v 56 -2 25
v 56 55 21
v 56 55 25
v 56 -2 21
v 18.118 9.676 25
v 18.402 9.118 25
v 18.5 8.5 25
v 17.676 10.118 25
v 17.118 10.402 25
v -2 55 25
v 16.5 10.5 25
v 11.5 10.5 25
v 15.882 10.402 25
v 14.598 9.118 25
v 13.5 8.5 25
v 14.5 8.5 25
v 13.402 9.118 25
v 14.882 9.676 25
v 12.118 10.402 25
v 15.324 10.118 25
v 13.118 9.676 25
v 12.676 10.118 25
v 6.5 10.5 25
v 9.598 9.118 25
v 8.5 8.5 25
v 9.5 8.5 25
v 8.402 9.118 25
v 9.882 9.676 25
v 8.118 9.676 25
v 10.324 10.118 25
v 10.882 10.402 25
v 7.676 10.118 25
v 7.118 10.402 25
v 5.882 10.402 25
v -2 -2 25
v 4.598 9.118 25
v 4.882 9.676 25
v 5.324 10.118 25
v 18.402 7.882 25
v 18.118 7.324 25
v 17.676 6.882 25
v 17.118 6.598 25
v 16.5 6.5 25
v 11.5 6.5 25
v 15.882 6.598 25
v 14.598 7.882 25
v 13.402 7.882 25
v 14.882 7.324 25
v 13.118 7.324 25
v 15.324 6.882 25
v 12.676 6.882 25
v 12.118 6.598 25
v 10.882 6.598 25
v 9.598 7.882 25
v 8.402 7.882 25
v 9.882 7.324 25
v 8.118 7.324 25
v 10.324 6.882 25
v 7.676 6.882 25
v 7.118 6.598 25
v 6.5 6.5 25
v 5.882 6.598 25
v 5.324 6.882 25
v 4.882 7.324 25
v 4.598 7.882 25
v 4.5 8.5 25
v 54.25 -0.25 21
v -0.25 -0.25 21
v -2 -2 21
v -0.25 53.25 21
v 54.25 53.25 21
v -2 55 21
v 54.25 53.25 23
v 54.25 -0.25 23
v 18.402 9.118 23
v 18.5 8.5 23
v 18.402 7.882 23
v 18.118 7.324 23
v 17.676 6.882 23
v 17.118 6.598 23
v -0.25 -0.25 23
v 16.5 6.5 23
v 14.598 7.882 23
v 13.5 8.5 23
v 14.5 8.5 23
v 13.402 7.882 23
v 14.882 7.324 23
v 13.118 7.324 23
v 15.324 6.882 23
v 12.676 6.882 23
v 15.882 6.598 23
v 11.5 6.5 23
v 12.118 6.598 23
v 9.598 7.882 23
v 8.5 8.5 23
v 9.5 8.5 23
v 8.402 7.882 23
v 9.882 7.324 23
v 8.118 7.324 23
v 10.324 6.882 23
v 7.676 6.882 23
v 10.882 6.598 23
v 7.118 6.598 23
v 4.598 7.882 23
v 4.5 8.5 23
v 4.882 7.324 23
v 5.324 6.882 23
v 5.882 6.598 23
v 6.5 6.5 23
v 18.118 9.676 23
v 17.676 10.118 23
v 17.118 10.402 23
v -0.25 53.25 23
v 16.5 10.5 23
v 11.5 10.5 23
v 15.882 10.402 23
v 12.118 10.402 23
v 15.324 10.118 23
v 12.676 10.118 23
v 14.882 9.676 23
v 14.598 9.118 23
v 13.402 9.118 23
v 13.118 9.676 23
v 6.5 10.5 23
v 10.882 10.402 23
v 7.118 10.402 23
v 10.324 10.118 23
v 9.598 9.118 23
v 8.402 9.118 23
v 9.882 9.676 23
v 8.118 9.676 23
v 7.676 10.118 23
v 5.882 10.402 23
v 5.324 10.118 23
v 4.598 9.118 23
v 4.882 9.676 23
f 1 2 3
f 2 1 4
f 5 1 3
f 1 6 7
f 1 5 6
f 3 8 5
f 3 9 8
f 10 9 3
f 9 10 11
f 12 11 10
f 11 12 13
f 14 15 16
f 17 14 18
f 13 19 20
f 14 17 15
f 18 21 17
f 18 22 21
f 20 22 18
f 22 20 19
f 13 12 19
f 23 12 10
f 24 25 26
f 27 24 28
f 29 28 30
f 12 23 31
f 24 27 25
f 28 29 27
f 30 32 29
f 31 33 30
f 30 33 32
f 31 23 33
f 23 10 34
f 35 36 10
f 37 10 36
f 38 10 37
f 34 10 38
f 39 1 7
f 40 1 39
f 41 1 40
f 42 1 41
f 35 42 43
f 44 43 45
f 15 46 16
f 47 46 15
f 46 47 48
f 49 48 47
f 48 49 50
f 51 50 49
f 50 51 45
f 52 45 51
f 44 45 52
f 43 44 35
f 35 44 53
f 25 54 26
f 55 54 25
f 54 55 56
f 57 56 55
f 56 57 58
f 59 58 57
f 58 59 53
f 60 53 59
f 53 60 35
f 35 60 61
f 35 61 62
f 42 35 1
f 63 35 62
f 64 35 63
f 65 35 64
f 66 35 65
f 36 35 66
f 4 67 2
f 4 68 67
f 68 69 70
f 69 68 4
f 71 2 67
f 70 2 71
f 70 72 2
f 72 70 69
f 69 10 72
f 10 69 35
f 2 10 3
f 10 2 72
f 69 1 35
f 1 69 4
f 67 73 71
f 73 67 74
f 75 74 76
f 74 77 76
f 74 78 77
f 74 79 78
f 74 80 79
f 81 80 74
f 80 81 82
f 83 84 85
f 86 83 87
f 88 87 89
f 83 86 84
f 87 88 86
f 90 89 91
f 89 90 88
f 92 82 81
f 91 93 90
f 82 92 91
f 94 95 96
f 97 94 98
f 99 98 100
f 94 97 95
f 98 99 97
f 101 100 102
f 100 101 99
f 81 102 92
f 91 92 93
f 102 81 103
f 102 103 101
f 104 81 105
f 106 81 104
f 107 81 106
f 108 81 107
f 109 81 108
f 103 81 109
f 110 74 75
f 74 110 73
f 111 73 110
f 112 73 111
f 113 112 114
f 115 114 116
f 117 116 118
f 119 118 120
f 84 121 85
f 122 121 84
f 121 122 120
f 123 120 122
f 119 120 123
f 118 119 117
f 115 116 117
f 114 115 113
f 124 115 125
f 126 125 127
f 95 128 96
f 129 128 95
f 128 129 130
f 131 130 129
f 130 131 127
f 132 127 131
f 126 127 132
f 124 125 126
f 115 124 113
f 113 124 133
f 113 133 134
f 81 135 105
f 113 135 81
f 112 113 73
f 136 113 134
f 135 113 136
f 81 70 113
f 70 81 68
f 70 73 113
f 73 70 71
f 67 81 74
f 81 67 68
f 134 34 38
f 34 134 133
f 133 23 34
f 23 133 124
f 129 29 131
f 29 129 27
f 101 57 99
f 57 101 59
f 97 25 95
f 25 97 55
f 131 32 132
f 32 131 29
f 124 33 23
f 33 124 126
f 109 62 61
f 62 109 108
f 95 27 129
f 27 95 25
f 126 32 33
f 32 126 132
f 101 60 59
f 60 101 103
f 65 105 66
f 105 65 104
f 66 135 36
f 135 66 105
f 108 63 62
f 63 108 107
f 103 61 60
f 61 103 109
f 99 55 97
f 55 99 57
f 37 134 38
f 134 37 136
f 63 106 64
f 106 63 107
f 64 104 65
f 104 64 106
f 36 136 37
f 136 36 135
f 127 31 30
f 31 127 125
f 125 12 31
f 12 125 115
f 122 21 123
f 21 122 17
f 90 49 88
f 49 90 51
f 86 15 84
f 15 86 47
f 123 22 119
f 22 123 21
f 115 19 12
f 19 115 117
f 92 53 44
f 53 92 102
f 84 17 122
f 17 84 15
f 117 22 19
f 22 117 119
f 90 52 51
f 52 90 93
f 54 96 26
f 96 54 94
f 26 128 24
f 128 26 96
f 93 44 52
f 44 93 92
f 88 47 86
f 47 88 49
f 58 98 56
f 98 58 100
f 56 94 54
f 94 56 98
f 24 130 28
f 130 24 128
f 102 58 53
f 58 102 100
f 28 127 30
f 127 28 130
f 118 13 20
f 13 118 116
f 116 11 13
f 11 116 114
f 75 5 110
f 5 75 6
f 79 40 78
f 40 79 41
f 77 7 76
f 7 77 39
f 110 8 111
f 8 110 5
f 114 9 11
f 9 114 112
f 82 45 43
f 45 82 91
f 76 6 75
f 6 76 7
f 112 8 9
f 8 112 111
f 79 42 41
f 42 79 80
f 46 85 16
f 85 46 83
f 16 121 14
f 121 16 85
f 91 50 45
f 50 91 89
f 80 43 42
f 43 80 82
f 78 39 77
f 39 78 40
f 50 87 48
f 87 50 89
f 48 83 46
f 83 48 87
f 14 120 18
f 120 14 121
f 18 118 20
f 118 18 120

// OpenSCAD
// 48 x 49.5 x 20
// Ergots de maintiens au centre sur le coté 49.5
// 2mm sous PCB
// PCB = 2mm
// 15 mm sur PCB

$DimX = 50;
$DimY = 49;
$DimZ = 17;
$WallThickness = 2;

$Box=0;
$Lid=1;


if ($Box==1){
    
    difference(){
    cube([$DimX + $WallThickness *2 ,
          $DimY + $WallThickness *2 ,
          $DimZ + $WallThickness *2 ]);
          
    translate([$WallThickness, $WallThickness, $WallThickness ]) cube([$DimX  ,
          $DimY ,
          $DimZ + 10]);

    // Rebord bas de boitier

    // Percage trous cables :
    translate([$WallThickness+ 4.5,5,$WallThickness+ 7.5]) 
           rotate([90,0,0])    cylinder (r=2, h=10, $fn=20);
    translate([$WallThickness+ 9.5,5,$WallThickness+ 7.5]) 
            rotate([90,0,0])    cylinder (r=2, h=10, $fn=20);
    translate([$WallThickness+ 14.5,5,$WallThickness+ 7.5]) 
            rotate([90,0,0])    cylinder (r=2, h=10, $fn=20);

    // Ventilations :  :
    translate([-5, 45, 10]) 
           rotate([0,90,0])    cylinder (r=1.5, h=10, $fn=20);
    translate([-5, 40, 10]) 
           rotate([0,90,0])    cylinder (r=1.5, h=10, $fn=20);
    translate([-5, 35, 10]) 
           rotate([0,90,0])    cylinder (r=1.5, h=10, $fn=20);
    translate([-5, 30, 10]) 
           rotate([0,90,0])    cylinder (r=1.5, h=10, $fn=20);

    translate([-5, 42, 13]) 
           rotate([0,90,0])    cylinder (r=1.5, h=10, $fn=20);
    translate([-5, 37, 13]) 
           rotate([0,90,0])    cylinder (r=1.5, h=10, $fn=20);
    translate([-5, 32, 13]) 
           rotate([0,90,0])    cylinder (r=1.5, h=10, $fn=20);
    translate([-5, 27, 13]) 
           rotate([0,90,0])    cylinder (r=1.5, h=10, $fn=20);

    translate([-5, 45, 16]) 
           rotate([0,90,0])    cylinder (r=1.5, h=10, $fn=20);
    translate([-5, 40, 16]) 
           rotate([0,90,0])    cylinder (r=1.5, h=10, $fn=20);
    translate([-5, 35, 16]) 
           rotate([0,90,0])    cylinder (r=1.5, h=10, $fn=20);
    translate([-5, 30, 16]) 
           rotate([0,90,0])    cylinder (r=1.5, h=10, $fn=20);

    };

    // Support PCB dans les angles, epaisseur 2mm
    translate([$WallThickness,$WallThickness, $WallThickness]) cube([2,2,2]);
    translate([$DimX, $WallThickness, $WallThickness]) cube([2,2,2]);
    translate([$WallThickness, $DimY, $WallThickness]) cube([2,2,2]);
    translate([$DimX, $DimY, $WallThickness]) cube([2,2,2]);
}

if($Lid==1){

    // Couvercle : 
    difference(){
        translate([-$WallThickness, -$WallThickness, $DimZ + $WallThickness*2 ]) 
            cube([$DimX + $WallThickness *4 ,
              $DimY + $WallThickness *4 ,
              $WallThickness *2 ]);

        translate ([-0.25, -0.25, $DimZ + $WallThickness]) 
            cube([$DimX +0.5 + $WallThickness *2 ,
                  $DimY +0.5 + $WallThickness *2 ,
                  $WallThickness *2 ]);

        // Percage trous cables :
        translate([$WallThickness+ 4.5 , 6.5 + $WallThickness , $DimZ]) 
               rotate([0,0,90])    cylinder (r=2, h=10, $fn=20);
        translate([$WallThickness+ 9.5 , 6.5 + $WallThickness , $DimZ]) 
               rotate([0,0,90])    cylinder (r=2, h=10, $fn=20);
        translate([$WallThickness+ 14.5 , 6.5 + $WallThickness , $DimZ]) 
               rotate([0,0,90])    cylinder (r=2, h=10, $fn=20);


    };

}
